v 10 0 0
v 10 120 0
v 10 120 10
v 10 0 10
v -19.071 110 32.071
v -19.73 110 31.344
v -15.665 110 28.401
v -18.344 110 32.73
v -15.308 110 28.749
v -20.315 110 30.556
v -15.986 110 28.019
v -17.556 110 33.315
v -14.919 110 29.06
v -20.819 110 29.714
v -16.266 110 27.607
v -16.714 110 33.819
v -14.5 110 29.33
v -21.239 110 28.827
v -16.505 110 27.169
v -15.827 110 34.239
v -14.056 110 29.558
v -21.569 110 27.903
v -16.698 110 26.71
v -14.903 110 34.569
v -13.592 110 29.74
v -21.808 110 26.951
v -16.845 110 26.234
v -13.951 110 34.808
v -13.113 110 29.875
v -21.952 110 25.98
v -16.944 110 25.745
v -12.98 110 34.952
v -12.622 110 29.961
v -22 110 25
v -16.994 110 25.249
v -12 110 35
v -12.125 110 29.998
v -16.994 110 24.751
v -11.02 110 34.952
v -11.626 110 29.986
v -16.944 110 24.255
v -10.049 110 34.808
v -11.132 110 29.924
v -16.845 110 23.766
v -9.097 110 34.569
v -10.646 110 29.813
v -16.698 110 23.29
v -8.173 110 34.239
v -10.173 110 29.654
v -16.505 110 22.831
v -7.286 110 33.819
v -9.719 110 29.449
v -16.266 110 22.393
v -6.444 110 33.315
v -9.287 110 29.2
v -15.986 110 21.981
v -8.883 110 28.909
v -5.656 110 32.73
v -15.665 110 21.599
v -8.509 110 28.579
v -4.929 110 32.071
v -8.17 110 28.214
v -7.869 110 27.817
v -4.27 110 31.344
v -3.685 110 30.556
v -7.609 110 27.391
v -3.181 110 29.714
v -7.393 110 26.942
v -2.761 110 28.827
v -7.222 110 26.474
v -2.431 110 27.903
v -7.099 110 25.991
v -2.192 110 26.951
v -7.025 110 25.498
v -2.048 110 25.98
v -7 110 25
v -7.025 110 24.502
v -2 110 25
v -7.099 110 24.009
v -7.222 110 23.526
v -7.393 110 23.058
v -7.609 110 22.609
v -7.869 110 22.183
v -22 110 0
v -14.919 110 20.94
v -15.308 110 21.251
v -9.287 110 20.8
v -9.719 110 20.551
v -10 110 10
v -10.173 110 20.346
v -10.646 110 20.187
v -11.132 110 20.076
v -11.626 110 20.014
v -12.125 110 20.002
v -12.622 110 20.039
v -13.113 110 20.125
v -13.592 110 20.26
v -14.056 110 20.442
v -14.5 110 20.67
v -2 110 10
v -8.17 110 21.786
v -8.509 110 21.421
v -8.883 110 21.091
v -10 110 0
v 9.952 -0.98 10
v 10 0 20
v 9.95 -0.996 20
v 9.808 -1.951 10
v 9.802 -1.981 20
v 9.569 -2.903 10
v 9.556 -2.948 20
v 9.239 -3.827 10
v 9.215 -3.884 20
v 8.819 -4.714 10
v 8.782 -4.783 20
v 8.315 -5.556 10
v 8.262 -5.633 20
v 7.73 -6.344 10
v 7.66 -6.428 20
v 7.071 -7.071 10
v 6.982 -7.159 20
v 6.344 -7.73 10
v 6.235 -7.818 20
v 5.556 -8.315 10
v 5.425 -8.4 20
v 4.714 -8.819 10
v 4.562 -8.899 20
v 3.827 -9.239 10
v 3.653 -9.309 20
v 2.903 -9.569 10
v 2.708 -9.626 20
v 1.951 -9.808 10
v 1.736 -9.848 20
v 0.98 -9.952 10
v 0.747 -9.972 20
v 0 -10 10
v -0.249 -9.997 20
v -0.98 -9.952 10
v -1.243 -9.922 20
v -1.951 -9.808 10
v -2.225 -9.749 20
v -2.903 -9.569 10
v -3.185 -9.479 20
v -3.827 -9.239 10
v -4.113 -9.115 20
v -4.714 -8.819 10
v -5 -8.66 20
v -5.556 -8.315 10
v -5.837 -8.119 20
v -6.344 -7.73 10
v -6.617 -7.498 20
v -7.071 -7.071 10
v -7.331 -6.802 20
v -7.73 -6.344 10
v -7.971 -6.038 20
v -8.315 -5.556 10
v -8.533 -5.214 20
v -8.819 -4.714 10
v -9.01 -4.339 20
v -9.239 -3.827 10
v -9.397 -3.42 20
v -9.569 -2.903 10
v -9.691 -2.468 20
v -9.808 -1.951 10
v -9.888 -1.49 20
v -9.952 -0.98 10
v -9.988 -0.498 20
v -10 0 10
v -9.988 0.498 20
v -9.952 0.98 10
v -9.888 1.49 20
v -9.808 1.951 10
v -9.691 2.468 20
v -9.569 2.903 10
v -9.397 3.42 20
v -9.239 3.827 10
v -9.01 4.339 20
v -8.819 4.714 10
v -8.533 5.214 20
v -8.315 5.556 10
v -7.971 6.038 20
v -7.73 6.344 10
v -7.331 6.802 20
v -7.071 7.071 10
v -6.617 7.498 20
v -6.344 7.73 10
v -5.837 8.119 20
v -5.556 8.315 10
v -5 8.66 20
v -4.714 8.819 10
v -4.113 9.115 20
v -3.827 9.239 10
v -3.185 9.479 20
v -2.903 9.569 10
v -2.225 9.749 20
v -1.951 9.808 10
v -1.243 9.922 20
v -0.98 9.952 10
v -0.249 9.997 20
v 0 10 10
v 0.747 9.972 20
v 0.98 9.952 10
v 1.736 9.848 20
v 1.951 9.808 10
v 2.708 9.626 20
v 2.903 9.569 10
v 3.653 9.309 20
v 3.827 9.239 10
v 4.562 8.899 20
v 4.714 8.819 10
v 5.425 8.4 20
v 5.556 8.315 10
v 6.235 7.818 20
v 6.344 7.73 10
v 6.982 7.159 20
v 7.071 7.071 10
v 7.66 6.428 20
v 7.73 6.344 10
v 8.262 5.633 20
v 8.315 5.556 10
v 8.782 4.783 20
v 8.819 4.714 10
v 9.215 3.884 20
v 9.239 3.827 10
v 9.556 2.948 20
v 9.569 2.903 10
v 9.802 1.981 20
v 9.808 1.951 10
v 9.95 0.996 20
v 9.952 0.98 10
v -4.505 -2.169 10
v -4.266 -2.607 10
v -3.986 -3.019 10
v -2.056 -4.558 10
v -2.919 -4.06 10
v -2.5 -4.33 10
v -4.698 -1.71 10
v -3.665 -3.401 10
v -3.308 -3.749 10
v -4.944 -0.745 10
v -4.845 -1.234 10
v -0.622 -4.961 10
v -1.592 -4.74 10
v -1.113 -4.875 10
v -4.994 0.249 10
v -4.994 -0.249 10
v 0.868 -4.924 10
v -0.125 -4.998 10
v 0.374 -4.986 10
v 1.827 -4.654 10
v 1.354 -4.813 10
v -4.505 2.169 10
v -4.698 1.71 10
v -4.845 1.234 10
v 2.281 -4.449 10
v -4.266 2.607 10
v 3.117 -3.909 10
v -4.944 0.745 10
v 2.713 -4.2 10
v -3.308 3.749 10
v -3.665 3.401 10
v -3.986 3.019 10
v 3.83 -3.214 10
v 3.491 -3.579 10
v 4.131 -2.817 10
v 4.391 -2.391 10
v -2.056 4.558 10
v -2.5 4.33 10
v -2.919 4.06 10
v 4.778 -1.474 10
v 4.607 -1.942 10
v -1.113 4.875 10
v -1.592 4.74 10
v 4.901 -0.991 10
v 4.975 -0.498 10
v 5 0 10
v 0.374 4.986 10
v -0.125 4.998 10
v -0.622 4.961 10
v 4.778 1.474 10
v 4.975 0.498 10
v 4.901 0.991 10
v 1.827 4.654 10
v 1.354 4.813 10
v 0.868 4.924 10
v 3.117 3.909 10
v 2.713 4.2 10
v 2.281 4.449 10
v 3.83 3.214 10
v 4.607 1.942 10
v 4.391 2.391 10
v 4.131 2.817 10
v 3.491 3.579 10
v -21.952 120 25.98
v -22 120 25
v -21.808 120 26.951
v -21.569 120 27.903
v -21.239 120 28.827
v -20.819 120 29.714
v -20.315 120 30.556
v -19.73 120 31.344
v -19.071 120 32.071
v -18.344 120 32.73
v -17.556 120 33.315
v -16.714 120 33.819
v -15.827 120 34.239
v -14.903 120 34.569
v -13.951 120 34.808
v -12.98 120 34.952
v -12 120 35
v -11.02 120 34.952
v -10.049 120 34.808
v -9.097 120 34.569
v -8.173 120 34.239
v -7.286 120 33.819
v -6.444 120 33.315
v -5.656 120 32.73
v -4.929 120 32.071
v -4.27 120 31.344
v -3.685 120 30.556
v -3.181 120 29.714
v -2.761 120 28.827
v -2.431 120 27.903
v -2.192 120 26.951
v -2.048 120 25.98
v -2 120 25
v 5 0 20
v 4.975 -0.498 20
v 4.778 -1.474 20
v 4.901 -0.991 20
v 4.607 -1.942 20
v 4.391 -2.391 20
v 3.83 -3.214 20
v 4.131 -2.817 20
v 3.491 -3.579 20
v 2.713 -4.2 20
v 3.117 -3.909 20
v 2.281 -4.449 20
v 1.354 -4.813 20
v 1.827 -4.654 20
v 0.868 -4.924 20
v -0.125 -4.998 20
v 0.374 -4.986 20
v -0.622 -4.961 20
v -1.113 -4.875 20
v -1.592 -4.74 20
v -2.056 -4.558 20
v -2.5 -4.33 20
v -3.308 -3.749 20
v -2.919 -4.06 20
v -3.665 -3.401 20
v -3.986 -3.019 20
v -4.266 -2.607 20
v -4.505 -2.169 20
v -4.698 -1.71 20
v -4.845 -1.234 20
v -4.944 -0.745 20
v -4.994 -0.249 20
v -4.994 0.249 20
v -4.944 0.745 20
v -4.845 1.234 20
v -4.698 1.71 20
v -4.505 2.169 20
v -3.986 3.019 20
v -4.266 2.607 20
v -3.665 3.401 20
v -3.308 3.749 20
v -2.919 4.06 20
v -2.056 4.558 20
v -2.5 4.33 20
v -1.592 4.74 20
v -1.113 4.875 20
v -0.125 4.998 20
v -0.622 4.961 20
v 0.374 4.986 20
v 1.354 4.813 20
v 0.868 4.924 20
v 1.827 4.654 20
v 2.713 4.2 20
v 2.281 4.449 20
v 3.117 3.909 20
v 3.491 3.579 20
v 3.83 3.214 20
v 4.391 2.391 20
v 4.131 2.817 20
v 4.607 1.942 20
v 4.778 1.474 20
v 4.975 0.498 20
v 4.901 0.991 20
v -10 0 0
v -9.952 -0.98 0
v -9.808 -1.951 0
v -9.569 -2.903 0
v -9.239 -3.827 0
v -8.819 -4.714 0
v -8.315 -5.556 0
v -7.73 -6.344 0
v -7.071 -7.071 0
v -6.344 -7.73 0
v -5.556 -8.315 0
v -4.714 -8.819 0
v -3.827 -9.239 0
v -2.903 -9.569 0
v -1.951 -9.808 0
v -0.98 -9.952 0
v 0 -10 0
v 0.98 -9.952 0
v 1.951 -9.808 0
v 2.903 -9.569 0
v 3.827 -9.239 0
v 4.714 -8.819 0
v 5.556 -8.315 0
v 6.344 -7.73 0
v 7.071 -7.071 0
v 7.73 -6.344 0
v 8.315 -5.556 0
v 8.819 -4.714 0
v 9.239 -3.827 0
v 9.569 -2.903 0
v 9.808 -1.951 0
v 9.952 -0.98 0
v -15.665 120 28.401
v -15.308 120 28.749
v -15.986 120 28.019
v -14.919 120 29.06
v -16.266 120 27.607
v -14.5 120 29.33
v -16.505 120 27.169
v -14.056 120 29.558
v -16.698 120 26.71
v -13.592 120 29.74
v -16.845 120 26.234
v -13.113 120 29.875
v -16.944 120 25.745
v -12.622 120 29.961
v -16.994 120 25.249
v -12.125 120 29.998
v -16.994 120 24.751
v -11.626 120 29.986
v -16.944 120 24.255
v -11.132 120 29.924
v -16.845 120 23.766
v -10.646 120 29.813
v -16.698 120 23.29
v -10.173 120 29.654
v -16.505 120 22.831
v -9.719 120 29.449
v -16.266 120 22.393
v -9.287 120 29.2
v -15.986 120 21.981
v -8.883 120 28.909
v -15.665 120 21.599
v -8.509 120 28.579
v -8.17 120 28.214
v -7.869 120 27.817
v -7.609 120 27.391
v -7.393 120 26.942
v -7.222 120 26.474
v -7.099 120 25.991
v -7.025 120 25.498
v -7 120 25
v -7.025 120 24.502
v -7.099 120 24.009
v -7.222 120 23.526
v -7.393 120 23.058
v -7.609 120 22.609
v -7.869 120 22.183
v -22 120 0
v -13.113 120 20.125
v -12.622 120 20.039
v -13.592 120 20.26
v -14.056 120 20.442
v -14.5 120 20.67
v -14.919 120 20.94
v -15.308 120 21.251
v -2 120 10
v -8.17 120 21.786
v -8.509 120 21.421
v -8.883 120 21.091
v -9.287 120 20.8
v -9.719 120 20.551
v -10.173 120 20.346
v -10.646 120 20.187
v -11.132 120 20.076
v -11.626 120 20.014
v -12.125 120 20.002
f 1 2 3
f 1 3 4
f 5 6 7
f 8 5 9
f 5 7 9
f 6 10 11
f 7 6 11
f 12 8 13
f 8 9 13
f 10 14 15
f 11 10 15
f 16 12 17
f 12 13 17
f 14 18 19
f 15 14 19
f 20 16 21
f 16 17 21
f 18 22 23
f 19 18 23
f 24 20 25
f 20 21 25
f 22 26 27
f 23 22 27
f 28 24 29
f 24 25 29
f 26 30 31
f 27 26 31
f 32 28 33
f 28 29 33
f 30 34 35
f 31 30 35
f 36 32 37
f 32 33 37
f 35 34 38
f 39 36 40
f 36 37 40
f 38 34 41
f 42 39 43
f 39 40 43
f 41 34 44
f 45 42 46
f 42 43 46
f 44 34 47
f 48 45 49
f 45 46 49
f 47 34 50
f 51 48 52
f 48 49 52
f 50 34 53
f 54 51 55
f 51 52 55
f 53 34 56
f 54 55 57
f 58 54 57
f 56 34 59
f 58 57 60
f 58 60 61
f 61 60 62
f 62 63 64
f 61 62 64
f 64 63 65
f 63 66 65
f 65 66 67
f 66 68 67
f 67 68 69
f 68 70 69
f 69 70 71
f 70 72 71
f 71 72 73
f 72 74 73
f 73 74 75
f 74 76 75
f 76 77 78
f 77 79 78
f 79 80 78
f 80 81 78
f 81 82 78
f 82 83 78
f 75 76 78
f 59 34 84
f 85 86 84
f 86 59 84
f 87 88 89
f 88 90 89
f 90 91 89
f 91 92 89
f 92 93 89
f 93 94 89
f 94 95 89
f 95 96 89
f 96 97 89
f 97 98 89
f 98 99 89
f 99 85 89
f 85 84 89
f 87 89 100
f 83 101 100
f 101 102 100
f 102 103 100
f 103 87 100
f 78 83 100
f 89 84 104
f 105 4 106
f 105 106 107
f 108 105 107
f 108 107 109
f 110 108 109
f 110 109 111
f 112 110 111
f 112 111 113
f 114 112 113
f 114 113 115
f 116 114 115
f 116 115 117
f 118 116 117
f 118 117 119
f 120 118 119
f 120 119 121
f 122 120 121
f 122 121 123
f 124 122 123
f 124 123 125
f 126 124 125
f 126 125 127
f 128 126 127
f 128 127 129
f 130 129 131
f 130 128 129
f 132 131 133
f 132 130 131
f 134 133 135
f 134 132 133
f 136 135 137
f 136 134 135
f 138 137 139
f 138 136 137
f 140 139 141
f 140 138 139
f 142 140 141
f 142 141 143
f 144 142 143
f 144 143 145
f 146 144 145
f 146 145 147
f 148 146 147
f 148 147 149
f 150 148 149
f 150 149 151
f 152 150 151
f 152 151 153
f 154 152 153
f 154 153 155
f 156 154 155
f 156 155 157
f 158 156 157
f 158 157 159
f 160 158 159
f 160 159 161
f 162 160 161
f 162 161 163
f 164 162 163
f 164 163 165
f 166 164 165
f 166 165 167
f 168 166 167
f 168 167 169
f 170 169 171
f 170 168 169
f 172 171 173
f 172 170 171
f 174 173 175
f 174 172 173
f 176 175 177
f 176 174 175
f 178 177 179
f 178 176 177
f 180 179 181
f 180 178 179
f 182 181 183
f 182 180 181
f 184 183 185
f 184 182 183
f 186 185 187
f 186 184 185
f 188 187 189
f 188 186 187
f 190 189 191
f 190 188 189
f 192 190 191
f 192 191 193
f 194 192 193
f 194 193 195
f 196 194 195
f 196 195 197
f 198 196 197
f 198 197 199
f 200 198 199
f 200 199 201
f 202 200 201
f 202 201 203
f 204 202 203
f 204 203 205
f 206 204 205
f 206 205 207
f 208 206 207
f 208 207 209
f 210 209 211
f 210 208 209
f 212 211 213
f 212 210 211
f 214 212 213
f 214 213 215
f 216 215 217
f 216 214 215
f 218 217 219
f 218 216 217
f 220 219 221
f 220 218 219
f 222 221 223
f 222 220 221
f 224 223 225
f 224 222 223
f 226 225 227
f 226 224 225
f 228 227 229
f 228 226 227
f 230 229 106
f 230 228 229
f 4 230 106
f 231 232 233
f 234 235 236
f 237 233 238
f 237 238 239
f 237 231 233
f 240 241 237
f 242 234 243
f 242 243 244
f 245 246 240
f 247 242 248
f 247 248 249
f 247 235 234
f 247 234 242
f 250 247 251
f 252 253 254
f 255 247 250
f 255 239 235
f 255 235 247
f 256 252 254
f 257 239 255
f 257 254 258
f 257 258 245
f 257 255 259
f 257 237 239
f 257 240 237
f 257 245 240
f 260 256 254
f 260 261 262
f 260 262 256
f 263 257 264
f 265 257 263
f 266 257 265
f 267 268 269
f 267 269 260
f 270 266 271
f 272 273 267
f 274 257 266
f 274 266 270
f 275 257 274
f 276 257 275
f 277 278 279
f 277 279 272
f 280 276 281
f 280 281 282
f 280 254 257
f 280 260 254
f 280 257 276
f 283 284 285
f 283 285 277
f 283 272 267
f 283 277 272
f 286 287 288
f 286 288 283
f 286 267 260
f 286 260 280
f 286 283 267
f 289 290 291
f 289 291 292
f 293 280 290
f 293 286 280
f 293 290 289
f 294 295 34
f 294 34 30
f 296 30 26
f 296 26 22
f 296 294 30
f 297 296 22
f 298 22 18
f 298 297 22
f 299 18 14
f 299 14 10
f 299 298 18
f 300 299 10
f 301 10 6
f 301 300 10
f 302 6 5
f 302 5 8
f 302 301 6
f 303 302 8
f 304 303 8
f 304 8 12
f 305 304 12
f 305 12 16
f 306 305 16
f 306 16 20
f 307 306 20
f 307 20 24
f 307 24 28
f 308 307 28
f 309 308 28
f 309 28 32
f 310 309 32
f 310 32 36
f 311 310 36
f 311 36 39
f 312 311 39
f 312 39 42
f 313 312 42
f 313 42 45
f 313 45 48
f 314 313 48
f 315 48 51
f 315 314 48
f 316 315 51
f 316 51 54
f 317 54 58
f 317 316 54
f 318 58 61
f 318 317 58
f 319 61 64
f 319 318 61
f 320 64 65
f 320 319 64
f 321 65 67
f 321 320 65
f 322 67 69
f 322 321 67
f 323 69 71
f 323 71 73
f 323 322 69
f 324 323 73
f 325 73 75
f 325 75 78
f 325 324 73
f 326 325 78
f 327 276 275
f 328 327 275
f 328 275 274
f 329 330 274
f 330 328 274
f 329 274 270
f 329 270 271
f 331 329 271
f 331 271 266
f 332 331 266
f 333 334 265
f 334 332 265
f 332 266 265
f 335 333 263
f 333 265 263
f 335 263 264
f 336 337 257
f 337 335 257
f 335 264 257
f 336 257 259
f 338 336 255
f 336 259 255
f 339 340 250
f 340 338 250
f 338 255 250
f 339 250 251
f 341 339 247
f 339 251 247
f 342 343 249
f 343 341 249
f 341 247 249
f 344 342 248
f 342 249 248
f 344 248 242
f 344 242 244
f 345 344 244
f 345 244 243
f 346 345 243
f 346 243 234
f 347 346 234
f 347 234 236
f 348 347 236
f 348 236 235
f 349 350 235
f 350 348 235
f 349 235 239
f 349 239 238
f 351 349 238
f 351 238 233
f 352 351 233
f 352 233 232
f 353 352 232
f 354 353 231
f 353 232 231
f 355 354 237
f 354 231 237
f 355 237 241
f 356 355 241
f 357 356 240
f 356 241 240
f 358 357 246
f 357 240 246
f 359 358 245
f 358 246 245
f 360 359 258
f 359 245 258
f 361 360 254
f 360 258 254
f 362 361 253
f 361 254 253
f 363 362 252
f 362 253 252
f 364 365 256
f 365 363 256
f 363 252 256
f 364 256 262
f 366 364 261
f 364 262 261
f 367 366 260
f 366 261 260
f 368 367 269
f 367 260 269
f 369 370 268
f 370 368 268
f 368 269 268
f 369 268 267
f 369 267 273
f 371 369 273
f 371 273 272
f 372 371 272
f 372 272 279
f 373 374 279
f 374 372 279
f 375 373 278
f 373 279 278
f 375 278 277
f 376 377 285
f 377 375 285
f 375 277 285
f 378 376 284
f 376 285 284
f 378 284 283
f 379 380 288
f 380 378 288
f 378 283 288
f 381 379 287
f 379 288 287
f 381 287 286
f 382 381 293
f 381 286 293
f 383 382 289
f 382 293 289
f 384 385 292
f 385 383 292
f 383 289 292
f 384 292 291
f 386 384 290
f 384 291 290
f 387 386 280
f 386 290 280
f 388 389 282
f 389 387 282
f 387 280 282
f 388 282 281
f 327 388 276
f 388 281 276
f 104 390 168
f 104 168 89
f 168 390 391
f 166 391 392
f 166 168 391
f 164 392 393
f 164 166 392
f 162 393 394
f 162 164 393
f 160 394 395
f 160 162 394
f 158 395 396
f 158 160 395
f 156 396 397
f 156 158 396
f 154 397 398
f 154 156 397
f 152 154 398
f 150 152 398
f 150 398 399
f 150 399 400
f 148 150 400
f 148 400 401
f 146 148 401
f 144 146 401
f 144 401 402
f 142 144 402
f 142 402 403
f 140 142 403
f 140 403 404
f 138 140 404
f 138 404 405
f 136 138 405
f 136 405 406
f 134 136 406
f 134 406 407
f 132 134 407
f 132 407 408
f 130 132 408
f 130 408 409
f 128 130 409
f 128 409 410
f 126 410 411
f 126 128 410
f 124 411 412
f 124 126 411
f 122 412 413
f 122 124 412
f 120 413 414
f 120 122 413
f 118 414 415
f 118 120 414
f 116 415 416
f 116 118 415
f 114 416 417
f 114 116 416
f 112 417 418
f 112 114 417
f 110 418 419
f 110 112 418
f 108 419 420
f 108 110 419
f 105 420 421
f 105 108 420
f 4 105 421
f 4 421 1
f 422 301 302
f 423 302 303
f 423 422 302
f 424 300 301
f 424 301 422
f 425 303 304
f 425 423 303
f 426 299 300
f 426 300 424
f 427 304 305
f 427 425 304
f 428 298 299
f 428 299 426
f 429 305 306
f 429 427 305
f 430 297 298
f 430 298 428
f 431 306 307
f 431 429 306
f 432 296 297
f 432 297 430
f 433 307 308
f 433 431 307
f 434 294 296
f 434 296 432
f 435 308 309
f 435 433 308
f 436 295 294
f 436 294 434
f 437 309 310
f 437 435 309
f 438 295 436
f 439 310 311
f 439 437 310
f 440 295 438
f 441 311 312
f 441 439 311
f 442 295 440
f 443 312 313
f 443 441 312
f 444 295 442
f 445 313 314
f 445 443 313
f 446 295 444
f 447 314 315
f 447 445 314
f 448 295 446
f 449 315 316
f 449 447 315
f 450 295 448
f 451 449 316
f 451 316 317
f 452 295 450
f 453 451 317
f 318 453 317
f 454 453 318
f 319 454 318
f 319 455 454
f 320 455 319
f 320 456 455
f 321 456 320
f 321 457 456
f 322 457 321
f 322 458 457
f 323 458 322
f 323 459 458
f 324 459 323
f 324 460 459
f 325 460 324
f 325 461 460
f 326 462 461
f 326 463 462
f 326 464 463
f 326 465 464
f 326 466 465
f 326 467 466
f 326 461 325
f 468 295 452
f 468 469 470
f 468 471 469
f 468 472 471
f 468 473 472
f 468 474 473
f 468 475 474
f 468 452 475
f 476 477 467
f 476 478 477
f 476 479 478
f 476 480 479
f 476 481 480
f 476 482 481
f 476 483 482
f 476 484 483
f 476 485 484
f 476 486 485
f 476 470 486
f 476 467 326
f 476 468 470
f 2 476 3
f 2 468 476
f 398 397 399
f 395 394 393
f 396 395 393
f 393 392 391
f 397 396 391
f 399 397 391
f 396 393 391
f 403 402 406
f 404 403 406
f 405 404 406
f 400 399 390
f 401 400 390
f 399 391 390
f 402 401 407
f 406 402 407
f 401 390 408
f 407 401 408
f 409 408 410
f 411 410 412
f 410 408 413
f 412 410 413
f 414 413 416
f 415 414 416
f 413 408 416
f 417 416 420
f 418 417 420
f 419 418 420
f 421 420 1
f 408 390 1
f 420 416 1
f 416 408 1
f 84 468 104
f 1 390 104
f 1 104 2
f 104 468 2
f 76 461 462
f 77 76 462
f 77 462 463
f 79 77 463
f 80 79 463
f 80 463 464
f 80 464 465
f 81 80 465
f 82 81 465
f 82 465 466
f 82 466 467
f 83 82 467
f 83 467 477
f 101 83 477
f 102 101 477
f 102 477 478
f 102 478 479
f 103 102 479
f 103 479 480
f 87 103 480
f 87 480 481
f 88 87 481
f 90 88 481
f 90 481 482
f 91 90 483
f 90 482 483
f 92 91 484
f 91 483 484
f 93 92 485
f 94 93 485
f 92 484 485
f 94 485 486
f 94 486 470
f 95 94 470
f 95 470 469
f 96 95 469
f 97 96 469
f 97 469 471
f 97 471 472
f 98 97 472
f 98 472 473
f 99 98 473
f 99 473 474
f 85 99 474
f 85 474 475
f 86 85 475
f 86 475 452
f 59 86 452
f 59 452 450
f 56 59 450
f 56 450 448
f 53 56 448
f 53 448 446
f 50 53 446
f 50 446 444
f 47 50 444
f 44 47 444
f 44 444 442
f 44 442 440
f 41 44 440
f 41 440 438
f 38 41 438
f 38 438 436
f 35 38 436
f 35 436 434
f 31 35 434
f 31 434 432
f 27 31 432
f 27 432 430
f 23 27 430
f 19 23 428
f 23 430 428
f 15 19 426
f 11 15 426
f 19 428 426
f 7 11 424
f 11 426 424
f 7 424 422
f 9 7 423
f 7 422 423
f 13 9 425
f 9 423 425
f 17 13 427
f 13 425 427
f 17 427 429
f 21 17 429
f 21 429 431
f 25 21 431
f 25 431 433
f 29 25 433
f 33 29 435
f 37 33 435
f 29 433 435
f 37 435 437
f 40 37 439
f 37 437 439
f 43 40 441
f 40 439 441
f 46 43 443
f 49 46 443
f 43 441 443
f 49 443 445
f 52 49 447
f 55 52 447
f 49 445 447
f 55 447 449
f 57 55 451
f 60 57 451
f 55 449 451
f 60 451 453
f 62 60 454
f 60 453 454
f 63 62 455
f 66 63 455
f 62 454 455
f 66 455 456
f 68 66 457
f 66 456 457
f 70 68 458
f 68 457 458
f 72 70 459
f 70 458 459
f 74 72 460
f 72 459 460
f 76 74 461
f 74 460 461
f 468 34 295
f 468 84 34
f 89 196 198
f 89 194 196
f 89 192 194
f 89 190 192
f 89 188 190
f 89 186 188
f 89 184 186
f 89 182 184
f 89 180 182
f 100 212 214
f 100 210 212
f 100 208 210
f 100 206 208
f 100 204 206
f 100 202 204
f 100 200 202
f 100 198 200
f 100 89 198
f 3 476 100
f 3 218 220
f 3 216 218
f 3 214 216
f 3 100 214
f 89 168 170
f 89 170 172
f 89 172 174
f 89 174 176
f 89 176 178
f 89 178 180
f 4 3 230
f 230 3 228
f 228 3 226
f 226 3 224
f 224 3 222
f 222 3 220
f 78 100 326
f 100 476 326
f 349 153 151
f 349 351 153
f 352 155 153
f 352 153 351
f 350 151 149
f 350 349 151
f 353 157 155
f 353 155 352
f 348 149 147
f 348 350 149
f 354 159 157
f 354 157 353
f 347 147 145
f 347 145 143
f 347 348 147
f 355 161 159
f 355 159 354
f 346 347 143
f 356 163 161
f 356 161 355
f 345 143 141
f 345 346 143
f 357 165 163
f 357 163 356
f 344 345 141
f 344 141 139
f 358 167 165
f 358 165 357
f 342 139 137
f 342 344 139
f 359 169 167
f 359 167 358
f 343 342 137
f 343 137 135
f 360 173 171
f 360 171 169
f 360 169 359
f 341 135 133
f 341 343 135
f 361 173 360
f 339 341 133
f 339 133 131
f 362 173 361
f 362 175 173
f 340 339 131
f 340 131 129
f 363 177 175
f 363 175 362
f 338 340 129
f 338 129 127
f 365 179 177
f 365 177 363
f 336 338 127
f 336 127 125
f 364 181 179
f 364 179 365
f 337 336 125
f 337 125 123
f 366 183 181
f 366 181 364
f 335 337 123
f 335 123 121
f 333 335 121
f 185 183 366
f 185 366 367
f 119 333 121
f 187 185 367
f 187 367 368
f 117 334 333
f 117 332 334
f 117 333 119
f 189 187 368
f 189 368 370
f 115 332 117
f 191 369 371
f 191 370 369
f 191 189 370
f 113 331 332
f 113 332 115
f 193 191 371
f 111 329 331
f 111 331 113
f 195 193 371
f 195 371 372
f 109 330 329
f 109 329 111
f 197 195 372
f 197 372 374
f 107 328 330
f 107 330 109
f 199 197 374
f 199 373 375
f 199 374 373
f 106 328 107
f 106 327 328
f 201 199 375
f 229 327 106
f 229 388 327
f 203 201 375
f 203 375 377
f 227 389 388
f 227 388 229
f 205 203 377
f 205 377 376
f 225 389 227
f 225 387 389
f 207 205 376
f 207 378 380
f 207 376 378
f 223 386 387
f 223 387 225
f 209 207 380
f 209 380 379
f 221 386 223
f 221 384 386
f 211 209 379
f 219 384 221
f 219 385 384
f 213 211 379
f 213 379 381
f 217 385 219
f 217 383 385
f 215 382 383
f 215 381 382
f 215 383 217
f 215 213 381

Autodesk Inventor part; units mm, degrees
ref_plane "YZ Plane" through (0, 0, 0) normal (1, 0, 0) x (0, 1, 0)
ref_plane "XZ Plane" through (0, 0, 0) normal (0, 1, 0) x (-1, 0, 0)
ref_plane "XY Plane" through (0, 0, 0) normal (0, 0, 1) x (1, 0, 0)
sketch "草圖1" plane through (0, 0, 0) normal (0, 0, 1) x (1, 0, 0)
  line L0 (-10, 120) -> (10, 120)
  line L1 (10, 120) -> (10, -20)
  line L2 (10, -20) -> (-10, -20)
  line L3 (-10, -20) -> (-10, 120)
  line L4 (10, 110) -> (-10, 110)
  line L5 (10, 120) -> (10, 110)
  line L6 (-10, 110) -> (-22, 110)
  line L7 (-22, 110) -> (-22, 120)
  line L8 (-22, 120) -> (-10, 120)
  line L9 (-10, 120) -> (-10, 110)
  line L10 (10, 110) -> (22, 110)
  line L11 (22, 110) -> (22, 120)
  line L12 (22, 120) -> (10, 120)
  line L13 (10, 120) -> (10, 110)
  point P0 (0, 0)
  point P1 (0, -20)
  dimension "d0" = 20
  dimension "d1" = 140
  dimension "d2" = 20
  dimension "d18" = 10
  dimension "d20" = 12
  dimension "d21" = 10
  dimension "d22" = 12
  dimension "d23" = 10
extrude "擠出1" add sketch "草圖1" along normal blind 10 contours L0 L1 L4 L3 | L3 L6 L7 L8 | L4 L1 L2 L3
sketch "草圖2" plane through (0, 0, 10) normal (0, 0, 1) x (1, 0, 0)
  circle A0 centre (0, 0) radius 10
  circle A1 centre (0, 0) radius 5
  dimension "d5" = 20
  dimension "d6" = 10
extrude "擠出2" add sketch "草圖2" along normal blind 10
sketch "草圖3" plane through (-10, 120, 0) normal (0, 1, 0) x (1, 0, 0)
  circle A0 centre (-2, -25) radius 10
  line L0 (20, -10) -> (-12, -10) projected
  line L1 (-12, 0) -> (20, 0) projected
  line L2 (-12, 0) -> (8, 0)
  line L3 (8, 0) -> (8, -25)
  line L4 (8, -25) -> (-12, -25)
  line L5 (-12, -25) -> (-12, 0)
  line L6 (-12, 0) -> (-12, -10) projected
  point P0 (10, 0)
  point P1 (0, -10)
  point P2 (0, 0)
  point P3 (32, -10)
  point P4 (32, 0)
  point P5 (8, -10)
  dimension "d9" = 20
  dimension "d10" = 25
extrude "擠出3" add sketch "草圖3" against normal blind 10 contours L4 A0 | A0 L5 L0 L3 | A0 L4
sketch "草圖4" plane through (-10, 120, 0) normal (0, 1, 0) x (1, 0, 0)
  circle A0 centre (-2, -25) radius 10 projected
  circle A1 centre (-2, -25) radius 5
  point P0 (10, 0)
  point P1 (8, -25)
  point P2 (-12, -25)
  point P3 (0, 25)
  dimension "d13" = 10
extrude "擠出4" cut sketch "草圖4" against normal blind 10 contours A1
sketch "草圖5" plane through (0, 0, 10) normal (0, 0, 1) x (1, 0, 0)
  arc A0 (-10, 0) -> (10, 0) centre (0, 0) ccw projected
  line L0 (-10, 0) -> (-10, -20) projected
  line L1 (-10, -20) -> (10, -20) projected
  line L2 (10, -20) -> (10, 0) projected
extrude "擠出5" cut sketch "草圖5" against normal through all
equation "\"d21\" = d18"
equation "\"d22\" = d20"
equation "\"d23\" = d21"
properties part number "本體"
